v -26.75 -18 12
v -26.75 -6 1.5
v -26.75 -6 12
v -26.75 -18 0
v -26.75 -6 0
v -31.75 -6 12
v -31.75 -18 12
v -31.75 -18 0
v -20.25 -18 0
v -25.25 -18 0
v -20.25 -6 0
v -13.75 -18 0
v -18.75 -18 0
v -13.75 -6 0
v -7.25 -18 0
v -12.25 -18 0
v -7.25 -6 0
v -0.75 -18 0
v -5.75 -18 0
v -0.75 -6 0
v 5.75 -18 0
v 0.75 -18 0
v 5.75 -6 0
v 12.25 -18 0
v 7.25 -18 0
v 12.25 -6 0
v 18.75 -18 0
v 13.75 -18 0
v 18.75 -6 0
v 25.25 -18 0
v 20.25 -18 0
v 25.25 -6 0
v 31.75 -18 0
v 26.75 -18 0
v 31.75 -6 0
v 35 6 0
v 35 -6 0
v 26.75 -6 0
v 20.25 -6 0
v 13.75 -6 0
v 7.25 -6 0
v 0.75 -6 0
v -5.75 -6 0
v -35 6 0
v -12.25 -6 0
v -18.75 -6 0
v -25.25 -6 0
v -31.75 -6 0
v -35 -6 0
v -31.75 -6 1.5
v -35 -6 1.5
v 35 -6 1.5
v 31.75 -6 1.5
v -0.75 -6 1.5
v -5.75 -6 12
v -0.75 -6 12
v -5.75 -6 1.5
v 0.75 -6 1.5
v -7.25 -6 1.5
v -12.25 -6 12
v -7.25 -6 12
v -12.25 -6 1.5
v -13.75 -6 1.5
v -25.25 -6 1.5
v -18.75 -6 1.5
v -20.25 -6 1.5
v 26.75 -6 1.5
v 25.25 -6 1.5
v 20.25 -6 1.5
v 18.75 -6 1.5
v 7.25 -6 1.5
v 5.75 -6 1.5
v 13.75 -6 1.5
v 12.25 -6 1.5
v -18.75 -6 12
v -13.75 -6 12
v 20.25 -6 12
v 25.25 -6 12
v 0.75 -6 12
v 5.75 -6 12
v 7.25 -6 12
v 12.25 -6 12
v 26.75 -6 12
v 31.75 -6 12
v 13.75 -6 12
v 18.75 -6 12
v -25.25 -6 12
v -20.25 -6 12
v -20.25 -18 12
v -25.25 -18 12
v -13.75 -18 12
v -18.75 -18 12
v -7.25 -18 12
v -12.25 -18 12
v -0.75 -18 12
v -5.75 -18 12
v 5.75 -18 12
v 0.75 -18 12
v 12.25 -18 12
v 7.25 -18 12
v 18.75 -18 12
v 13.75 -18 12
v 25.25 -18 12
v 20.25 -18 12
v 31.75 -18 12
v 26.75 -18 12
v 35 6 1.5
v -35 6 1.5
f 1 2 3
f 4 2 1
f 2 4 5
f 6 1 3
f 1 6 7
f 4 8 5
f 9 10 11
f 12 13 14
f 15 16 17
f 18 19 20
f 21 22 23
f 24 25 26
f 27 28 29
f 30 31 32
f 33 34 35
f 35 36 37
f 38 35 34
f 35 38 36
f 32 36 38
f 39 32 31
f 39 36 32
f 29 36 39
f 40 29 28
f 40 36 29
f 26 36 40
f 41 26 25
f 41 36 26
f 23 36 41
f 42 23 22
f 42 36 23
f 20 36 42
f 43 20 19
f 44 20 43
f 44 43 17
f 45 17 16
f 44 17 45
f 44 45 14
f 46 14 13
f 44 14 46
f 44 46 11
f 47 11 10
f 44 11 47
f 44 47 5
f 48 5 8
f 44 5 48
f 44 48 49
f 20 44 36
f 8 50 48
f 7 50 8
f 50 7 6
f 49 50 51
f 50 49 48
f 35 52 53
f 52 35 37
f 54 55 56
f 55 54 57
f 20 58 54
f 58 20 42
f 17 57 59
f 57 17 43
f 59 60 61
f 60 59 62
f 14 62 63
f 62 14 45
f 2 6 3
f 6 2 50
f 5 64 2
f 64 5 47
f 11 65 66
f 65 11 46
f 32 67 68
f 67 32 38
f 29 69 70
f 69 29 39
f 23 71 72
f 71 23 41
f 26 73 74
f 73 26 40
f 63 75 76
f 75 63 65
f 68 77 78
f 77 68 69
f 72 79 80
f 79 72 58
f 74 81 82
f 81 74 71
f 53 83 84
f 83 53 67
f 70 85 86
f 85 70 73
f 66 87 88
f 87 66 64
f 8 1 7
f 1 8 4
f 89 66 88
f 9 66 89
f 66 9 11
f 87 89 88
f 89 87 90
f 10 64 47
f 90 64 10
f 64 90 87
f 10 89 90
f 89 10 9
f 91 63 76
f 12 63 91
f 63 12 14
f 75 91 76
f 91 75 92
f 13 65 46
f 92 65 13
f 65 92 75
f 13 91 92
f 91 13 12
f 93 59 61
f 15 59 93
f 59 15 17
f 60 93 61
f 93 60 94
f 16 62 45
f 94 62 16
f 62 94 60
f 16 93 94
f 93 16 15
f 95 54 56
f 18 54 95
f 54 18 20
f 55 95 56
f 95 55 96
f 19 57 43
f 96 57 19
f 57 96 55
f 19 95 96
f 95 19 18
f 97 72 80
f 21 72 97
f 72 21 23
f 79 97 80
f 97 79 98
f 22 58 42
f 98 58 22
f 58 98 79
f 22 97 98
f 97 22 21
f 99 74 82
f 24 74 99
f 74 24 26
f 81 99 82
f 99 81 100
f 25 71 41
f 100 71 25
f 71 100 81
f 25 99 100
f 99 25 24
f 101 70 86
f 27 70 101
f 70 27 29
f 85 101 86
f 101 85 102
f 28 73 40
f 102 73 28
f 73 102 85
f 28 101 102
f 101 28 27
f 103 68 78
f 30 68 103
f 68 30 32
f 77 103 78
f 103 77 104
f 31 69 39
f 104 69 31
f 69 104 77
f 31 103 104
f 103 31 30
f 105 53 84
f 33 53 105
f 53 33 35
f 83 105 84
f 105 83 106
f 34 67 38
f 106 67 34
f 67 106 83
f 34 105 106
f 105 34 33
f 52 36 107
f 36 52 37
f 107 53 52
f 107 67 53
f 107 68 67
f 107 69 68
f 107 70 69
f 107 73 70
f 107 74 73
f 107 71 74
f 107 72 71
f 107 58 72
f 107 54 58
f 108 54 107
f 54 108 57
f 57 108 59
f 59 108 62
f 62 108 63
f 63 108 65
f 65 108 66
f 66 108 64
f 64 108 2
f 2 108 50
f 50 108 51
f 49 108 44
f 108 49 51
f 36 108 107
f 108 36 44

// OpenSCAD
// 10-well agarose gel comb, printed lying flat
// Units: mm

// ---- Spine ----
spine_len   = 70;   // spine length (X)
spine_wid   = 12;   // spine width (Y)
plate_thk   = 1.5;  // plate thickness (Z)

// ---- Teeth ----
tooth_count = 10;   // number of teeth
tooth_w     = 5.0;  // tooth width (X)
tooth_l     = 12;   // tooth length (Y)
tooth_h     = 12;   // tooth height from spine (Z)

// ---- Gaps ----
gap         = 1.5;  // gap between neighbouring teeth (X)

// ---- Derived ----
pitch       = tooth_w + gap;              // centre-to-centre spacing
x_start     = -(tooth_count - 1) * pitch / 2; // first tooth centre (row centred on spine)
eps         = 0.5;   // cutter overshoot past faces

union() {
    // Spine (back bar)
    translate([-spine_len / 2, -spine_wid / 2, 0])
        cube([spine_len, spine_wid, plate_thk]);

    // Teeth, hanging in -Y from the spine's long edge
    for (i = [0 : tooth_count - 1]) {
        translate([x_start + i * pitch - tooth_w / 2,
                   -spine_wid / 2 - tooth_l,
                   0])
            cube([tooth_w, tooth_l, tooth_h]);
    }
}
